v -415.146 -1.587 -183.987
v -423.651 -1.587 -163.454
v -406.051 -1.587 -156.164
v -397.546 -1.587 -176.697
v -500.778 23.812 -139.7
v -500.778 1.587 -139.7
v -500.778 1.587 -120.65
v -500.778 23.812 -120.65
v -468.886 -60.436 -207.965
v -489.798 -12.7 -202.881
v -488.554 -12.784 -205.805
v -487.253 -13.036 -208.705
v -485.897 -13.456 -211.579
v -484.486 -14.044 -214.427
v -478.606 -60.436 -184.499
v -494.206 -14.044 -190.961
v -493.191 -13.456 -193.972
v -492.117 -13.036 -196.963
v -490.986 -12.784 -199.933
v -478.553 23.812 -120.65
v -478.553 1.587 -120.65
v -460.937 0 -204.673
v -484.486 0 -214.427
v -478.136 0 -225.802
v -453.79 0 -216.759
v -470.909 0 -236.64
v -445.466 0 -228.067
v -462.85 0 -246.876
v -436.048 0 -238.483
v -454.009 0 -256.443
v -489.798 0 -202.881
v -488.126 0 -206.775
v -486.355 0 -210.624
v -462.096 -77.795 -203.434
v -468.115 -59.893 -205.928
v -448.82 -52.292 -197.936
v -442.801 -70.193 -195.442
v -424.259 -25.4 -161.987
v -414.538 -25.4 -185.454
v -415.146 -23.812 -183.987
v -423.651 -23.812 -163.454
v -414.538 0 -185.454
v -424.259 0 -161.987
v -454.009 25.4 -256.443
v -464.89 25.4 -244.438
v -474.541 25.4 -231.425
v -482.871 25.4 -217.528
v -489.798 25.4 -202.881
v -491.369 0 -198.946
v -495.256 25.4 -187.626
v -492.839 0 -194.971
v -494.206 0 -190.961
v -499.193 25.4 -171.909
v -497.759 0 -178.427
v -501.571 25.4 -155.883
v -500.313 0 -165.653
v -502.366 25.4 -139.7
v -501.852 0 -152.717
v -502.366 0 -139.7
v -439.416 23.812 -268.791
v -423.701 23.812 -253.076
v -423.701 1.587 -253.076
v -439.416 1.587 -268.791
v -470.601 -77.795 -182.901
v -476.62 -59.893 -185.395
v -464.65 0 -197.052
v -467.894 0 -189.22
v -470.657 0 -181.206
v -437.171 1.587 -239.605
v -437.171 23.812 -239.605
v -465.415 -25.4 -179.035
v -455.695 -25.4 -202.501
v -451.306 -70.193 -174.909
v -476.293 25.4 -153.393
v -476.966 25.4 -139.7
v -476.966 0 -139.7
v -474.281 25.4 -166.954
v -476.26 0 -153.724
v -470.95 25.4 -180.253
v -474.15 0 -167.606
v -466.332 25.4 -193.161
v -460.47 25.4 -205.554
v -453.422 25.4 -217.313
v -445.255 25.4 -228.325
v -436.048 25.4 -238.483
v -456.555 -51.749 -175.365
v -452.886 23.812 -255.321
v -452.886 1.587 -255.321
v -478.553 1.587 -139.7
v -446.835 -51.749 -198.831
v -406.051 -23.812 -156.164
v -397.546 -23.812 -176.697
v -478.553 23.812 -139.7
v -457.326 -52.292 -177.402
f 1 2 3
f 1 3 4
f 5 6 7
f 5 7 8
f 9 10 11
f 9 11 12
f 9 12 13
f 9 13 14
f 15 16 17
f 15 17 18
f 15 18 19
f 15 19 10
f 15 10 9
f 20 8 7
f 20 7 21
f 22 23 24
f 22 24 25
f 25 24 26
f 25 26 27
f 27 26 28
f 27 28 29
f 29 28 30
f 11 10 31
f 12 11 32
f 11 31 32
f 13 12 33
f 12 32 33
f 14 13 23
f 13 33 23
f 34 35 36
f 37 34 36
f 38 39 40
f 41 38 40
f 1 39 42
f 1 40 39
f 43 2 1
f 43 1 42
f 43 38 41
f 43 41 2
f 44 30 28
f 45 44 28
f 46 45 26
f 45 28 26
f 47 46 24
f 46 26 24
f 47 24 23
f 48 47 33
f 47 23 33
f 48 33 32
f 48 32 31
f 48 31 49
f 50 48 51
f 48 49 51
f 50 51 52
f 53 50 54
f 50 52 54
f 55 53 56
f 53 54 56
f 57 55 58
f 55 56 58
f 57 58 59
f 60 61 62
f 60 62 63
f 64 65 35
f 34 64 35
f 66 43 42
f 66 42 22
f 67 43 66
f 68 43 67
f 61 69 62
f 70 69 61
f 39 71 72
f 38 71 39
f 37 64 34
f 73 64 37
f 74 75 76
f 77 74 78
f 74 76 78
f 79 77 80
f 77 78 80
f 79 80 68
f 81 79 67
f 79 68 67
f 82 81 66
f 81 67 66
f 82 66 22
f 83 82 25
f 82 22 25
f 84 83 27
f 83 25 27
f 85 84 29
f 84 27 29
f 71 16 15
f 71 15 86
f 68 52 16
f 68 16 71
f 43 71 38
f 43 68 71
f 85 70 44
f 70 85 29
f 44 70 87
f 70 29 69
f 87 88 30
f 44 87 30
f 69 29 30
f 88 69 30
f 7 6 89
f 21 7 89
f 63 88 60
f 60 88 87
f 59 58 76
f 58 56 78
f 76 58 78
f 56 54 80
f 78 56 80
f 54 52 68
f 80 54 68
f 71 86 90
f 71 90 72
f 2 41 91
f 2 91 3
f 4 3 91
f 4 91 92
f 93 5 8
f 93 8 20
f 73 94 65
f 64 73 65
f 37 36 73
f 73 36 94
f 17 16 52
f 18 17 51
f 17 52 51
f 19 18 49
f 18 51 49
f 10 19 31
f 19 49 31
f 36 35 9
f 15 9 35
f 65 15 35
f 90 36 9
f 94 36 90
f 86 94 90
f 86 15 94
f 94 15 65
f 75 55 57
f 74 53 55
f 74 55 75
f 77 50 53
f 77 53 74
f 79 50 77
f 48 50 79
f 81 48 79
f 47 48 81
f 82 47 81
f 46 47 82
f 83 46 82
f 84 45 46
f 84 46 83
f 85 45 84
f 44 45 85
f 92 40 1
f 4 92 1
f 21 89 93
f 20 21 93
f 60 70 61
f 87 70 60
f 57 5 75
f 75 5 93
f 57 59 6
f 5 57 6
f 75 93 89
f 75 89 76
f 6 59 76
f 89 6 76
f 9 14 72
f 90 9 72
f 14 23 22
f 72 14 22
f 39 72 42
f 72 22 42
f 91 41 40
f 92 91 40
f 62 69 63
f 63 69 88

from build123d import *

# Parameters (mm, degrees)
BOSS_EXTRUDE1_DEPTH = 25.4
BOSS_EXTRUDE2_DEPTH = 12.7
SKETCH3_W           = 22.225
SKETCH3_H           = 22.225
BOSS_EXTRUDE3_DEPTH = 19.05
SKETCH4_W           = 22.225
SKETCH4_H           = 22.225
BOSS_EXTRUDE4_DEPTH = 19.05
SKETCH5_W           = 22.225
SKETCH5_H           = 22.225
BOSS_EXTRUDE5_DEPTH = 19.05
BOSS_EXTRUDE6_DEPTH = 19.05
CUT_EXTRUDE1_DEPTH  = 580.024222363


with BuildPart() as part:
    # Sketch1 → Boss-Extrude1 (new body)
    with BuildSketch(Plane(origin=(0, 0, 0), x_dir=(1, 0, 0), z_dir=(0, 1, 0))):
        with BuildLine():
            ThreePointArc((-476.965634664, 139.7), (-466.331605355, 193.160875501), (-436.048451995, 238.482817332))
            Line((-436.048451995, 238.482817332), (-454.008964237, 256.443329574))
            ThreePointArc((-454.008964237, 256.443329574), (-489.798145481, 202.881034683), (-502.365634664, 139.7))
            Line((-502.365634664, 139.7), (-476.965634664, 139.7))
        make_face()
    extrude(amount=BOSS_EXTRUDE1_DEPTH)

    # Sketch2 → Boss-Extrude2 (add, symmetric)
    with BuildSketch(Plane(origin=(0, 0, 0), x_dir=(0.9238795325112892, 0, 0.3826834323650839), z_dir=(-0.3826834323650839, 0, 0.9238795325112892))):
        Polygon((-530.153692386, 0), (-530.153692386, -12.7), (-512.779069106, -60.436385136), (-488.910876538, -51.749073495), (-498.50115499, -25.4), (-453.953692386, -25.4), (-453.953692386, 0), align=None)
    extrude(amount=BOSS_EXTRUDE2_DEPTH, both=True)

    # Sketch3 → Boss-Extrude3 (add)
    with BuildSketch(Plane.XY.offset(-139.7)):
        with Locations((-489.665634664, 12.7)):
            Rectangle(SKETCH3_W, SKETCH3_H)
    extrude(amount=BOSS_EXTRUDE3_DEPTH)

    # Sketch4 → Boss-Extrude4 (add)
    with BuildSketch(Plane(origin=(-98.782817332, 0, 98.782817332), x_dir=(-0.7071067811865343, 0, -0.7071067811865608), z_dir=(0.7071067811865608, 0, -0.7071067811865343))):
        with Locations((489.665634664, 12.7)):
            Rectangle(SKETCH4_W, SKETCH4_H)
    extrude(amount=BOSS_EXTRUDE4_DEPTH)

    # Sketch5 → Boss-Extrude5 (add)
    with BuildSketch(Plane(origin=(-419.398525104, 0, -173.720557137), x_dir=(0.3826834323650839, 0, -0.9238795325112892), z_dir=(0.9238795325112892, 0, 0.3826834323650839))):
        with Locations((0, -12.7)):
            Rectangle(SKETCH5_W, SKETCH5_H)
    extrude(amount=BOSS_EXTRUDE5_DEPTH)

    # Sketch6 → Boss-Extrude6 (add)
    with BuildSketch(Plane(origin=(-37.4724398, 111.437344998, -15.52159278), x_dir=(0.9487640489542349, 0.3129641753372822, -0.043591333627466894), z_dir=(0.31598541012516107, -0.9396926207859091, 0.13088544238586405))):
        Polygon((-462.863246728, -191.884470829), (-453.898805786, -212.221368911), (-433.561907704, -203.25692797), (-442.526348645, -182.920029887), align=None)
    extrude(amount=BOSS_EXTRUDE6_DEPTH)

    # Sketch7 → Cut-Extrude1 (cut, through all)
    with BuildSketch(Plane(origin=(0, 25.4, 0), x_dir=(1, 0, 0), z_dir=(0, 1, 0))):
        with BuildLine():
            ThreePointArc((-494.206275899, 190.960561143), (-492.116958141, 196.963230937), (-489.798145481, 202.881034683))
            Line((-489.798145481, 202.881034683), (-494.658225072, 191.147764621))
            Line((-494.658225072, 191.147764621), (-494.206275899, 190.960561143))
        make_face()
        with BuildLine():
            Line((-484.486116716, 214.427101269), (-484.93806589, 214.614304746))
            Line((-484.93806589, 214.614304746), (-489.798145481, 202.881034683))
            ThreePointArc((-489.798145481, 202.881034683), (-487.253274478, 208.705201999), (-484.486116716, 214.427101269))
        make_face()
    extrude(amount=-CUT_EXTRUDE1_DEPTH, mode=Mode.SUBTRACT)


solid = part.part
